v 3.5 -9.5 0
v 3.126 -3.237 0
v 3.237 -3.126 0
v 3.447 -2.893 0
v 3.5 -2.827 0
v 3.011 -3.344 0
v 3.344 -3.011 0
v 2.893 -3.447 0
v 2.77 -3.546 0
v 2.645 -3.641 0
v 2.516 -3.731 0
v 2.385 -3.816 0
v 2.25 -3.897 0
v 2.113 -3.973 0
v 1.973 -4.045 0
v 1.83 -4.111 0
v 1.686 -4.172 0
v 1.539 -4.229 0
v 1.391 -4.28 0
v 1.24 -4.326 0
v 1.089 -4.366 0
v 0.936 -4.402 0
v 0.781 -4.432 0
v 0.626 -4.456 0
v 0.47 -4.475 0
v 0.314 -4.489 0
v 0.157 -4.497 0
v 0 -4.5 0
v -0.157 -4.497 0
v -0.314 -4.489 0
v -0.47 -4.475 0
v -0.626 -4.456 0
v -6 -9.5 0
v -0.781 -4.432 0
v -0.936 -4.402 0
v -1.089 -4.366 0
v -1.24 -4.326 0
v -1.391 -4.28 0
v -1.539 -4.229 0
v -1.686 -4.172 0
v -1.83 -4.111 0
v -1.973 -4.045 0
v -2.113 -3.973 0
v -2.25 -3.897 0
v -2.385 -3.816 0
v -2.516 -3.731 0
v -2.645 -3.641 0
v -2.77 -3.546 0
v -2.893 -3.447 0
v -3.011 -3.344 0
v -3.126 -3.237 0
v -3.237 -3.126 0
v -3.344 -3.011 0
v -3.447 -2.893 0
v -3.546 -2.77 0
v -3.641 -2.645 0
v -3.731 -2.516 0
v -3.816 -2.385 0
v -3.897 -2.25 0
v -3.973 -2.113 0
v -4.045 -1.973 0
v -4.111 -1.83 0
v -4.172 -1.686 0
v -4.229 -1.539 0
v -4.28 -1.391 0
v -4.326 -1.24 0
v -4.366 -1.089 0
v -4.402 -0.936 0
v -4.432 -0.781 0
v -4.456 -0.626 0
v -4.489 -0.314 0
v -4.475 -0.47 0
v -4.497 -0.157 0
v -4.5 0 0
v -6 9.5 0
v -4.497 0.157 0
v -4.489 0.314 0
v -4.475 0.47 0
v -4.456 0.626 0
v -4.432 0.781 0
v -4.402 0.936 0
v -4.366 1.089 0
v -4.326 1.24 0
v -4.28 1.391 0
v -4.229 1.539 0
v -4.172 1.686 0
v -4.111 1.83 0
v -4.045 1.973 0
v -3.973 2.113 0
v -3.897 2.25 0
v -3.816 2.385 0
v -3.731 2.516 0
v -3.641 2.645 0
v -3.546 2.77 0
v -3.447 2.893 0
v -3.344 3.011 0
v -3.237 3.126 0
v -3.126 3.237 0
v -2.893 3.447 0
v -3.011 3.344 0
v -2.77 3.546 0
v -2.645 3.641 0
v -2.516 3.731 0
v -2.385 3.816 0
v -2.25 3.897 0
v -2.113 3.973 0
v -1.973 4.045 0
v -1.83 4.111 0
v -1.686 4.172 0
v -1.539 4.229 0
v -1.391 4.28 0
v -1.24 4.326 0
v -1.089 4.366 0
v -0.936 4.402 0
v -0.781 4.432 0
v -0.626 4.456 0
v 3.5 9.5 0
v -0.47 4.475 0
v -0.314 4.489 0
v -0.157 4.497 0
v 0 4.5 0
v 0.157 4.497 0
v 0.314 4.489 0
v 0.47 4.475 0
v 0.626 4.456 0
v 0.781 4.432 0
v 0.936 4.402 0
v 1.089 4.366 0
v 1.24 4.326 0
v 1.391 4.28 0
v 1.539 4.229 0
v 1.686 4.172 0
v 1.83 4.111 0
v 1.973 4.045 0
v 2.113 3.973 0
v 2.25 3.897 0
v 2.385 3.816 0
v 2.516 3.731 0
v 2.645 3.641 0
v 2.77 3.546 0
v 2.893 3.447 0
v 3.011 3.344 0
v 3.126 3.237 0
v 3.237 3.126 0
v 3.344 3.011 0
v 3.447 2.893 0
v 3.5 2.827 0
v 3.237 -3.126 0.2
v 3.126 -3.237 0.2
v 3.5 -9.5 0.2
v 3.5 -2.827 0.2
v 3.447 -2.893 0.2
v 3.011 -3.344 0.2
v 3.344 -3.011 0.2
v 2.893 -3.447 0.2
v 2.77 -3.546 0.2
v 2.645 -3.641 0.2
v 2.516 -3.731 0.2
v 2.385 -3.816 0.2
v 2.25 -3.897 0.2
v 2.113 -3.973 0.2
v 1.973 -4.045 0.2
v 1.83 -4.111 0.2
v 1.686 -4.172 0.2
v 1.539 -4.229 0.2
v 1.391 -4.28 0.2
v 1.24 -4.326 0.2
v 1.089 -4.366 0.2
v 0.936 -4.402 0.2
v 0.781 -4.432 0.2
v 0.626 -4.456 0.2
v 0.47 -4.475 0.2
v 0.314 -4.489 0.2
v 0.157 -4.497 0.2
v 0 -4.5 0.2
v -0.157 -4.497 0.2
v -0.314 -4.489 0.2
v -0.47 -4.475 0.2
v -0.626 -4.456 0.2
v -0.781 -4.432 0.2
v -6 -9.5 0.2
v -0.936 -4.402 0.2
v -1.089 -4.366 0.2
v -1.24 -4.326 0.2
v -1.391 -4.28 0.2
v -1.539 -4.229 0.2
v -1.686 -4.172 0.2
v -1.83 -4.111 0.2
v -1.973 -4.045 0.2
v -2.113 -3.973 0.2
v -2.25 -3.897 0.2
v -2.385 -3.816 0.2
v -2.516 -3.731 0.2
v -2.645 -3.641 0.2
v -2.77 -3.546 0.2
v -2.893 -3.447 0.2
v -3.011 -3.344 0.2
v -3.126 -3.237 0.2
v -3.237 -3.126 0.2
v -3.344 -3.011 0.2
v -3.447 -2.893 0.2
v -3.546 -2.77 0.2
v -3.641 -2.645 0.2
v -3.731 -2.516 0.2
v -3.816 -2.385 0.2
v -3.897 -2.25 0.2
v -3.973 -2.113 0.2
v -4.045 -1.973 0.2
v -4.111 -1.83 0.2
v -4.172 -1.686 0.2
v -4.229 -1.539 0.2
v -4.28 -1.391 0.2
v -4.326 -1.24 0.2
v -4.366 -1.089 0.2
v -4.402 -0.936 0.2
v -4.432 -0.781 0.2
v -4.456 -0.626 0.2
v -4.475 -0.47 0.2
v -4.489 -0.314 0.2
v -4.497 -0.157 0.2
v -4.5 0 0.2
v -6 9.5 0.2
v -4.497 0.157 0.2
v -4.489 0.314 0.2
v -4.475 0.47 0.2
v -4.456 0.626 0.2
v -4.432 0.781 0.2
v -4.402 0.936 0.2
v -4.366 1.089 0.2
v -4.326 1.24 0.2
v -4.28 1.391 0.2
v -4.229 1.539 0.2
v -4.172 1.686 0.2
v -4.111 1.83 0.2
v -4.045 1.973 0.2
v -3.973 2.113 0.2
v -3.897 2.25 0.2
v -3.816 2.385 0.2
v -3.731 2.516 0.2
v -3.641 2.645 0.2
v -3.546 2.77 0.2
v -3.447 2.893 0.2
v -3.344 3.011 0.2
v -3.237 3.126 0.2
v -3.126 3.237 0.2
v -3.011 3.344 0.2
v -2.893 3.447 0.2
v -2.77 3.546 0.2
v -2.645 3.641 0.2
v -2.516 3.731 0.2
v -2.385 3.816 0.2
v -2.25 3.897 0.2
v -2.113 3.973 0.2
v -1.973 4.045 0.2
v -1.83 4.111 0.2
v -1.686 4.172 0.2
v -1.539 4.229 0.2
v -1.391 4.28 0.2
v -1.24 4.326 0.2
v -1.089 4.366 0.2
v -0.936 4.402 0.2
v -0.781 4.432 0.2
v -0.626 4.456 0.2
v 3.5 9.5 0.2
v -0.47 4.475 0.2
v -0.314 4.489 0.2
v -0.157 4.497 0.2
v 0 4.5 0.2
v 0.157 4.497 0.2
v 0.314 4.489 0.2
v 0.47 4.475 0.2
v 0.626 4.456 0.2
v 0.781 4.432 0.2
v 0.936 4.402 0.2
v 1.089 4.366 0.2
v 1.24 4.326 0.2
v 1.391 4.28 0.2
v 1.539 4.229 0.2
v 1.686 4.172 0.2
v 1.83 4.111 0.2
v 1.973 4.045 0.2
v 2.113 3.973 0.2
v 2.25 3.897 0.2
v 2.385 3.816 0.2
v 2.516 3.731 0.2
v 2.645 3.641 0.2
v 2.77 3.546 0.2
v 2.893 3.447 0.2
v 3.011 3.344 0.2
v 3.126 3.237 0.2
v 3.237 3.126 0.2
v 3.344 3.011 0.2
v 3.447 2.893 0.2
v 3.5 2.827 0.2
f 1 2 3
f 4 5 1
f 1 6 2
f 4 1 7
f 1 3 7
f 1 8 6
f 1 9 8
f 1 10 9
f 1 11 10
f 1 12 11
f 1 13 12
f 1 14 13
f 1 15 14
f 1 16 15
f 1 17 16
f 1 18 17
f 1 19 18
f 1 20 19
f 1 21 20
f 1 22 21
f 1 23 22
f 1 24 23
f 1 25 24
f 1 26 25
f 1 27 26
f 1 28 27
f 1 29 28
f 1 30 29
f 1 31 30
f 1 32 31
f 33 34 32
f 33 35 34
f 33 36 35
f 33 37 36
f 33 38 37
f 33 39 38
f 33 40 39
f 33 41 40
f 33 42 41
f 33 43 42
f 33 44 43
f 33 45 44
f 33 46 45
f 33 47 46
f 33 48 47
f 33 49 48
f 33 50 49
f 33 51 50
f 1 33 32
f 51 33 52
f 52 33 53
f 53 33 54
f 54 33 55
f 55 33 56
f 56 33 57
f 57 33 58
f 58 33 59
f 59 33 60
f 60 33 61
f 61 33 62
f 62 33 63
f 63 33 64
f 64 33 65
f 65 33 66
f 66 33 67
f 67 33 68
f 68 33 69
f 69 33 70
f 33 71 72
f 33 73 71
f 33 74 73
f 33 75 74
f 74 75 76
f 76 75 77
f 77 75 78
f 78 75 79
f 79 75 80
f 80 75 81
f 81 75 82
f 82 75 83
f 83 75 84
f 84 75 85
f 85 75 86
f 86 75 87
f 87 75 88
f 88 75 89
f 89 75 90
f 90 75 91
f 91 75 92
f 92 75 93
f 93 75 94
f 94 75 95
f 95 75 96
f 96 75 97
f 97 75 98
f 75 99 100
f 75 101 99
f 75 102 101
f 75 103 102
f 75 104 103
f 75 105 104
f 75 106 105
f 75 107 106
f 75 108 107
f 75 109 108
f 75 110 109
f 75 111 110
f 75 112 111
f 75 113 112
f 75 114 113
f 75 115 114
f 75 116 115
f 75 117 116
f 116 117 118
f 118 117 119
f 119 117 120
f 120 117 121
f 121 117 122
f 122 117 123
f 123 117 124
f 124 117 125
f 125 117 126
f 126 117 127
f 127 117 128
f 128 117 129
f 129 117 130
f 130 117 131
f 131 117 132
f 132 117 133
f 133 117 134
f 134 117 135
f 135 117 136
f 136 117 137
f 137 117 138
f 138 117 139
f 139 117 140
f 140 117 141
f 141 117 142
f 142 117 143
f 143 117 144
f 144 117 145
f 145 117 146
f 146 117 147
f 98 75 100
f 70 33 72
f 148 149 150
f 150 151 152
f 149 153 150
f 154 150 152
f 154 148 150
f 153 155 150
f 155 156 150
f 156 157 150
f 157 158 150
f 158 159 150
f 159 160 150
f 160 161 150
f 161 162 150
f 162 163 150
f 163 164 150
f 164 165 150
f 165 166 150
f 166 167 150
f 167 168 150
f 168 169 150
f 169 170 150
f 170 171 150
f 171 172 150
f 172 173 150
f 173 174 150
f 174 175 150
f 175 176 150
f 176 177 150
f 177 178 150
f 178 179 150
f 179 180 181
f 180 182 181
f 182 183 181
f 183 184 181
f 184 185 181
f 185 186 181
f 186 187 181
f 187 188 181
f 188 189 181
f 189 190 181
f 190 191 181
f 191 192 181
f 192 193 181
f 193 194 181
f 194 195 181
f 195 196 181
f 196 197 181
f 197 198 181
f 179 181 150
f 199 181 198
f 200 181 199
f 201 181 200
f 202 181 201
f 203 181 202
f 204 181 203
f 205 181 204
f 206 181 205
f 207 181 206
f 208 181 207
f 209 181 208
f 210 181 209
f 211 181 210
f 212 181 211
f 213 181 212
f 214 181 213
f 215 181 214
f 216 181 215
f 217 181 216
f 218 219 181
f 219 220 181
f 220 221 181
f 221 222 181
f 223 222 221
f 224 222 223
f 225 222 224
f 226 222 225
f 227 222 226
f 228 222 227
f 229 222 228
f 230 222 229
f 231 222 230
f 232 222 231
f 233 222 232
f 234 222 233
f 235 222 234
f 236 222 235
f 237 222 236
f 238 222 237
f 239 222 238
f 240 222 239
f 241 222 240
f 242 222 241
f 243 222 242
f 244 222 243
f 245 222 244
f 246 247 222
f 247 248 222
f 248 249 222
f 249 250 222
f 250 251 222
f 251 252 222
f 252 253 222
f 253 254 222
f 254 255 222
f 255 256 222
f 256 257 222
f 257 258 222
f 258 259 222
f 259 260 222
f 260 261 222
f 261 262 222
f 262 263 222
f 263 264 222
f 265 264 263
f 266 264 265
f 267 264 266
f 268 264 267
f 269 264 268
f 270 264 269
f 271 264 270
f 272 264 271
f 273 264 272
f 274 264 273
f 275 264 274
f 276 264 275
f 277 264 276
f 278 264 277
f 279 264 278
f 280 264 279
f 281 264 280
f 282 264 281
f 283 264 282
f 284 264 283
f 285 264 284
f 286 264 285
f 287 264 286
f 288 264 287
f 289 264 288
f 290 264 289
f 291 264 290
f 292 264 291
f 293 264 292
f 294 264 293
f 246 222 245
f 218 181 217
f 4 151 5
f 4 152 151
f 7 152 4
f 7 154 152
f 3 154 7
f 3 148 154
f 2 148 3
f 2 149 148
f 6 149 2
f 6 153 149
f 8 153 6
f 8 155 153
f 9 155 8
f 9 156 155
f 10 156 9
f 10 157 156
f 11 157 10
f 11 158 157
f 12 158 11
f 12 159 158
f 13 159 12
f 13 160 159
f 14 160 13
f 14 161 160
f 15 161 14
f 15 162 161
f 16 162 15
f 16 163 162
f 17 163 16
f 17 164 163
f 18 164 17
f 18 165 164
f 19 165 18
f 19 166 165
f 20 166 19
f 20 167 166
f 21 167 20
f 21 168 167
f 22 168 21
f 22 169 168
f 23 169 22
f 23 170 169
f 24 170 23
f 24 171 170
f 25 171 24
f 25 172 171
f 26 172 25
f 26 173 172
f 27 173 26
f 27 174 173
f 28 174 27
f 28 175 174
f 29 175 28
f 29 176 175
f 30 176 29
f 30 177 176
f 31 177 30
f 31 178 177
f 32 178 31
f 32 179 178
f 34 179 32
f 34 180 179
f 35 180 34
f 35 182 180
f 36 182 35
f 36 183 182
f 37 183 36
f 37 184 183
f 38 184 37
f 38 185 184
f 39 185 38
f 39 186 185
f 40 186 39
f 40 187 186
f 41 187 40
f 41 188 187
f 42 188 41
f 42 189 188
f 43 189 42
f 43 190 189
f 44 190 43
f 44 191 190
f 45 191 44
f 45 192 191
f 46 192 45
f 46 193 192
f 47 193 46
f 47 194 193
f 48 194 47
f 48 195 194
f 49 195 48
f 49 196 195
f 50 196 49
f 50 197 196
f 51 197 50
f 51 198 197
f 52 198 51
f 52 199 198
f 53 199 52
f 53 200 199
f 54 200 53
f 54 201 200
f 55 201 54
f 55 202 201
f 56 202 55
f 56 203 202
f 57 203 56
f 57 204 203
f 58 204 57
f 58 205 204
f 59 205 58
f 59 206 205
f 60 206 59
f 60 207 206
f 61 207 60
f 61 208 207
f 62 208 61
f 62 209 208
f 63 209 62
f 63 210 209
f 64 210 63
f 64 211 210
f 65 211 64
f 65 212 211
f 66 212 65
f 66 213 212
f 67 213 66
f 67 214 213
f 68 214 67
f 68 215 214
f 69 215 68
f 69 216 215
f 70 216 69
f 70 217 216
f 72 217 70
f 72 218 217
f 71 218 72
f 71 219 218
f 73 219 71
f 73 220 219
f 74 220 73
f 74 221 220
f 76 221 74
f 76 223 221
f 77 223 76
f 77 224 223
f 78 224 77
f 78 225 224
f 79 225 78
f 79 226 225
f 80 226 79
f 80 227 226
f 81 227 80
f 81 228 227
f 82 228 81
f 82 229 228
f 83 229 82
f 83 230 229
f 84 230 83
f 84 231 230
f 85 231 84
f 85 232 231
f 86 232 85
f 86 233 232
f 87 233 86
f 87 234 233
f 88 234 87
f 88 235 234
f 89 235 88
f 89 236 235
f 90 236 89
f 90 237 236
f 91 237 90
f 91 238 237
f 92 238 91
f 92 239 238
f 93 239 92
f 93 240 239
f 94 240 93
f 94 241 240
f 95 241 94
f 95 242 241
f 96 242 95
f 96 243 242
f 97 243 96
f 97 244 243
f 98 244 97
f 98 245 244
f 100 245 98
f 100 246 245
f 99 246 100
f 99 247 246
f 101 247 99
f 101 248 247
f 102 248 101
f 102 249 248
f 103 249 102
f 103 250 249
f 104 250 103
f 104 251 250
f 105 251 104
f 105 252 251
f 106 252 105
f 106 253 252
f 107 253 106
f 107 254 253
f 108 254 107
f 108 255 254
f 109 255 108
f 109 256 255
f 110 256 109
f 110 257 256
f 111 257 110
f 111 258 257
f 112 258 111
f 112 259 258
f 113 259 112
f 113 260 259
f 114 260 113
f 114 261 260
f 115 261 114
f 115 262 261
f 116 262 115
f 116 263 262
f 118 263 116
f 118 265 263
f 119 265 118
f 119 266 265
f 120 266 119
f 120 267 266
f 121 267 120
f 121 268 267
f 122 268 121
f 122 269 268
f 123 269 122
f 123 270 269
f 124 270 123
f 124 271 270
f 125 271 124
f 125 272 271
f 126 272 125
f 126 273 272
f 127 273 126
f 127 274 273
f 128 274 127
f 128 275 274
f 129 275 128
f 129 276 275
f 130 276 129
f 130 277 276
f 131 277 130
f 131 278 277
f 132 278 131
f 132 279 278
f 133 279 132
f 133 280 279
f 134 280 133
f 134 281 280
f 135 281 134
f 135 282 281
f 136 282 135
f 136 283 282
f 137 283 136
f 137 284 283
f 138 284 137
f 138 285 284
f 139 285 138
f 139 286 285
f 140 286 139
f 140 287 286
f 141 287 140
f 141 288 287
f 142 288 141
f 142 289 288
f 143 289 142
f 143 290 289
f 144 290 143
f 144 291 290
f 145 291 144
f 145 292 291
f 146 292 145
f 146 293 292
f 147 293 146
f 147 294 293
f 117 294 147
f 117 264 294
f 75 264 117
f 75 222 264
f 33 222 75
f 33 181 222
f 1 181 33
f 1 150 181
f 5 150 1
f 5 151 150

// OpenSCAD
// Millimetres. Proposed coupon, unqualified transfer/bond. One layer, 0.2 mm PETG.
// openscad -o coupon.stl coupon.scad; for a 24-coupon plate: -D batch=true
batch = false;
module coupon() {
  linear_extrude(height=0.2) difference() {
    translate([-6,-9.5]) square([9.5,19]);
    circle(r=4.5,$fn=180);
  }
}
if(batch) for(i=[0:5],j=[0:3]) translate([12*i,22*j,0]) coupon();
else coupon();
